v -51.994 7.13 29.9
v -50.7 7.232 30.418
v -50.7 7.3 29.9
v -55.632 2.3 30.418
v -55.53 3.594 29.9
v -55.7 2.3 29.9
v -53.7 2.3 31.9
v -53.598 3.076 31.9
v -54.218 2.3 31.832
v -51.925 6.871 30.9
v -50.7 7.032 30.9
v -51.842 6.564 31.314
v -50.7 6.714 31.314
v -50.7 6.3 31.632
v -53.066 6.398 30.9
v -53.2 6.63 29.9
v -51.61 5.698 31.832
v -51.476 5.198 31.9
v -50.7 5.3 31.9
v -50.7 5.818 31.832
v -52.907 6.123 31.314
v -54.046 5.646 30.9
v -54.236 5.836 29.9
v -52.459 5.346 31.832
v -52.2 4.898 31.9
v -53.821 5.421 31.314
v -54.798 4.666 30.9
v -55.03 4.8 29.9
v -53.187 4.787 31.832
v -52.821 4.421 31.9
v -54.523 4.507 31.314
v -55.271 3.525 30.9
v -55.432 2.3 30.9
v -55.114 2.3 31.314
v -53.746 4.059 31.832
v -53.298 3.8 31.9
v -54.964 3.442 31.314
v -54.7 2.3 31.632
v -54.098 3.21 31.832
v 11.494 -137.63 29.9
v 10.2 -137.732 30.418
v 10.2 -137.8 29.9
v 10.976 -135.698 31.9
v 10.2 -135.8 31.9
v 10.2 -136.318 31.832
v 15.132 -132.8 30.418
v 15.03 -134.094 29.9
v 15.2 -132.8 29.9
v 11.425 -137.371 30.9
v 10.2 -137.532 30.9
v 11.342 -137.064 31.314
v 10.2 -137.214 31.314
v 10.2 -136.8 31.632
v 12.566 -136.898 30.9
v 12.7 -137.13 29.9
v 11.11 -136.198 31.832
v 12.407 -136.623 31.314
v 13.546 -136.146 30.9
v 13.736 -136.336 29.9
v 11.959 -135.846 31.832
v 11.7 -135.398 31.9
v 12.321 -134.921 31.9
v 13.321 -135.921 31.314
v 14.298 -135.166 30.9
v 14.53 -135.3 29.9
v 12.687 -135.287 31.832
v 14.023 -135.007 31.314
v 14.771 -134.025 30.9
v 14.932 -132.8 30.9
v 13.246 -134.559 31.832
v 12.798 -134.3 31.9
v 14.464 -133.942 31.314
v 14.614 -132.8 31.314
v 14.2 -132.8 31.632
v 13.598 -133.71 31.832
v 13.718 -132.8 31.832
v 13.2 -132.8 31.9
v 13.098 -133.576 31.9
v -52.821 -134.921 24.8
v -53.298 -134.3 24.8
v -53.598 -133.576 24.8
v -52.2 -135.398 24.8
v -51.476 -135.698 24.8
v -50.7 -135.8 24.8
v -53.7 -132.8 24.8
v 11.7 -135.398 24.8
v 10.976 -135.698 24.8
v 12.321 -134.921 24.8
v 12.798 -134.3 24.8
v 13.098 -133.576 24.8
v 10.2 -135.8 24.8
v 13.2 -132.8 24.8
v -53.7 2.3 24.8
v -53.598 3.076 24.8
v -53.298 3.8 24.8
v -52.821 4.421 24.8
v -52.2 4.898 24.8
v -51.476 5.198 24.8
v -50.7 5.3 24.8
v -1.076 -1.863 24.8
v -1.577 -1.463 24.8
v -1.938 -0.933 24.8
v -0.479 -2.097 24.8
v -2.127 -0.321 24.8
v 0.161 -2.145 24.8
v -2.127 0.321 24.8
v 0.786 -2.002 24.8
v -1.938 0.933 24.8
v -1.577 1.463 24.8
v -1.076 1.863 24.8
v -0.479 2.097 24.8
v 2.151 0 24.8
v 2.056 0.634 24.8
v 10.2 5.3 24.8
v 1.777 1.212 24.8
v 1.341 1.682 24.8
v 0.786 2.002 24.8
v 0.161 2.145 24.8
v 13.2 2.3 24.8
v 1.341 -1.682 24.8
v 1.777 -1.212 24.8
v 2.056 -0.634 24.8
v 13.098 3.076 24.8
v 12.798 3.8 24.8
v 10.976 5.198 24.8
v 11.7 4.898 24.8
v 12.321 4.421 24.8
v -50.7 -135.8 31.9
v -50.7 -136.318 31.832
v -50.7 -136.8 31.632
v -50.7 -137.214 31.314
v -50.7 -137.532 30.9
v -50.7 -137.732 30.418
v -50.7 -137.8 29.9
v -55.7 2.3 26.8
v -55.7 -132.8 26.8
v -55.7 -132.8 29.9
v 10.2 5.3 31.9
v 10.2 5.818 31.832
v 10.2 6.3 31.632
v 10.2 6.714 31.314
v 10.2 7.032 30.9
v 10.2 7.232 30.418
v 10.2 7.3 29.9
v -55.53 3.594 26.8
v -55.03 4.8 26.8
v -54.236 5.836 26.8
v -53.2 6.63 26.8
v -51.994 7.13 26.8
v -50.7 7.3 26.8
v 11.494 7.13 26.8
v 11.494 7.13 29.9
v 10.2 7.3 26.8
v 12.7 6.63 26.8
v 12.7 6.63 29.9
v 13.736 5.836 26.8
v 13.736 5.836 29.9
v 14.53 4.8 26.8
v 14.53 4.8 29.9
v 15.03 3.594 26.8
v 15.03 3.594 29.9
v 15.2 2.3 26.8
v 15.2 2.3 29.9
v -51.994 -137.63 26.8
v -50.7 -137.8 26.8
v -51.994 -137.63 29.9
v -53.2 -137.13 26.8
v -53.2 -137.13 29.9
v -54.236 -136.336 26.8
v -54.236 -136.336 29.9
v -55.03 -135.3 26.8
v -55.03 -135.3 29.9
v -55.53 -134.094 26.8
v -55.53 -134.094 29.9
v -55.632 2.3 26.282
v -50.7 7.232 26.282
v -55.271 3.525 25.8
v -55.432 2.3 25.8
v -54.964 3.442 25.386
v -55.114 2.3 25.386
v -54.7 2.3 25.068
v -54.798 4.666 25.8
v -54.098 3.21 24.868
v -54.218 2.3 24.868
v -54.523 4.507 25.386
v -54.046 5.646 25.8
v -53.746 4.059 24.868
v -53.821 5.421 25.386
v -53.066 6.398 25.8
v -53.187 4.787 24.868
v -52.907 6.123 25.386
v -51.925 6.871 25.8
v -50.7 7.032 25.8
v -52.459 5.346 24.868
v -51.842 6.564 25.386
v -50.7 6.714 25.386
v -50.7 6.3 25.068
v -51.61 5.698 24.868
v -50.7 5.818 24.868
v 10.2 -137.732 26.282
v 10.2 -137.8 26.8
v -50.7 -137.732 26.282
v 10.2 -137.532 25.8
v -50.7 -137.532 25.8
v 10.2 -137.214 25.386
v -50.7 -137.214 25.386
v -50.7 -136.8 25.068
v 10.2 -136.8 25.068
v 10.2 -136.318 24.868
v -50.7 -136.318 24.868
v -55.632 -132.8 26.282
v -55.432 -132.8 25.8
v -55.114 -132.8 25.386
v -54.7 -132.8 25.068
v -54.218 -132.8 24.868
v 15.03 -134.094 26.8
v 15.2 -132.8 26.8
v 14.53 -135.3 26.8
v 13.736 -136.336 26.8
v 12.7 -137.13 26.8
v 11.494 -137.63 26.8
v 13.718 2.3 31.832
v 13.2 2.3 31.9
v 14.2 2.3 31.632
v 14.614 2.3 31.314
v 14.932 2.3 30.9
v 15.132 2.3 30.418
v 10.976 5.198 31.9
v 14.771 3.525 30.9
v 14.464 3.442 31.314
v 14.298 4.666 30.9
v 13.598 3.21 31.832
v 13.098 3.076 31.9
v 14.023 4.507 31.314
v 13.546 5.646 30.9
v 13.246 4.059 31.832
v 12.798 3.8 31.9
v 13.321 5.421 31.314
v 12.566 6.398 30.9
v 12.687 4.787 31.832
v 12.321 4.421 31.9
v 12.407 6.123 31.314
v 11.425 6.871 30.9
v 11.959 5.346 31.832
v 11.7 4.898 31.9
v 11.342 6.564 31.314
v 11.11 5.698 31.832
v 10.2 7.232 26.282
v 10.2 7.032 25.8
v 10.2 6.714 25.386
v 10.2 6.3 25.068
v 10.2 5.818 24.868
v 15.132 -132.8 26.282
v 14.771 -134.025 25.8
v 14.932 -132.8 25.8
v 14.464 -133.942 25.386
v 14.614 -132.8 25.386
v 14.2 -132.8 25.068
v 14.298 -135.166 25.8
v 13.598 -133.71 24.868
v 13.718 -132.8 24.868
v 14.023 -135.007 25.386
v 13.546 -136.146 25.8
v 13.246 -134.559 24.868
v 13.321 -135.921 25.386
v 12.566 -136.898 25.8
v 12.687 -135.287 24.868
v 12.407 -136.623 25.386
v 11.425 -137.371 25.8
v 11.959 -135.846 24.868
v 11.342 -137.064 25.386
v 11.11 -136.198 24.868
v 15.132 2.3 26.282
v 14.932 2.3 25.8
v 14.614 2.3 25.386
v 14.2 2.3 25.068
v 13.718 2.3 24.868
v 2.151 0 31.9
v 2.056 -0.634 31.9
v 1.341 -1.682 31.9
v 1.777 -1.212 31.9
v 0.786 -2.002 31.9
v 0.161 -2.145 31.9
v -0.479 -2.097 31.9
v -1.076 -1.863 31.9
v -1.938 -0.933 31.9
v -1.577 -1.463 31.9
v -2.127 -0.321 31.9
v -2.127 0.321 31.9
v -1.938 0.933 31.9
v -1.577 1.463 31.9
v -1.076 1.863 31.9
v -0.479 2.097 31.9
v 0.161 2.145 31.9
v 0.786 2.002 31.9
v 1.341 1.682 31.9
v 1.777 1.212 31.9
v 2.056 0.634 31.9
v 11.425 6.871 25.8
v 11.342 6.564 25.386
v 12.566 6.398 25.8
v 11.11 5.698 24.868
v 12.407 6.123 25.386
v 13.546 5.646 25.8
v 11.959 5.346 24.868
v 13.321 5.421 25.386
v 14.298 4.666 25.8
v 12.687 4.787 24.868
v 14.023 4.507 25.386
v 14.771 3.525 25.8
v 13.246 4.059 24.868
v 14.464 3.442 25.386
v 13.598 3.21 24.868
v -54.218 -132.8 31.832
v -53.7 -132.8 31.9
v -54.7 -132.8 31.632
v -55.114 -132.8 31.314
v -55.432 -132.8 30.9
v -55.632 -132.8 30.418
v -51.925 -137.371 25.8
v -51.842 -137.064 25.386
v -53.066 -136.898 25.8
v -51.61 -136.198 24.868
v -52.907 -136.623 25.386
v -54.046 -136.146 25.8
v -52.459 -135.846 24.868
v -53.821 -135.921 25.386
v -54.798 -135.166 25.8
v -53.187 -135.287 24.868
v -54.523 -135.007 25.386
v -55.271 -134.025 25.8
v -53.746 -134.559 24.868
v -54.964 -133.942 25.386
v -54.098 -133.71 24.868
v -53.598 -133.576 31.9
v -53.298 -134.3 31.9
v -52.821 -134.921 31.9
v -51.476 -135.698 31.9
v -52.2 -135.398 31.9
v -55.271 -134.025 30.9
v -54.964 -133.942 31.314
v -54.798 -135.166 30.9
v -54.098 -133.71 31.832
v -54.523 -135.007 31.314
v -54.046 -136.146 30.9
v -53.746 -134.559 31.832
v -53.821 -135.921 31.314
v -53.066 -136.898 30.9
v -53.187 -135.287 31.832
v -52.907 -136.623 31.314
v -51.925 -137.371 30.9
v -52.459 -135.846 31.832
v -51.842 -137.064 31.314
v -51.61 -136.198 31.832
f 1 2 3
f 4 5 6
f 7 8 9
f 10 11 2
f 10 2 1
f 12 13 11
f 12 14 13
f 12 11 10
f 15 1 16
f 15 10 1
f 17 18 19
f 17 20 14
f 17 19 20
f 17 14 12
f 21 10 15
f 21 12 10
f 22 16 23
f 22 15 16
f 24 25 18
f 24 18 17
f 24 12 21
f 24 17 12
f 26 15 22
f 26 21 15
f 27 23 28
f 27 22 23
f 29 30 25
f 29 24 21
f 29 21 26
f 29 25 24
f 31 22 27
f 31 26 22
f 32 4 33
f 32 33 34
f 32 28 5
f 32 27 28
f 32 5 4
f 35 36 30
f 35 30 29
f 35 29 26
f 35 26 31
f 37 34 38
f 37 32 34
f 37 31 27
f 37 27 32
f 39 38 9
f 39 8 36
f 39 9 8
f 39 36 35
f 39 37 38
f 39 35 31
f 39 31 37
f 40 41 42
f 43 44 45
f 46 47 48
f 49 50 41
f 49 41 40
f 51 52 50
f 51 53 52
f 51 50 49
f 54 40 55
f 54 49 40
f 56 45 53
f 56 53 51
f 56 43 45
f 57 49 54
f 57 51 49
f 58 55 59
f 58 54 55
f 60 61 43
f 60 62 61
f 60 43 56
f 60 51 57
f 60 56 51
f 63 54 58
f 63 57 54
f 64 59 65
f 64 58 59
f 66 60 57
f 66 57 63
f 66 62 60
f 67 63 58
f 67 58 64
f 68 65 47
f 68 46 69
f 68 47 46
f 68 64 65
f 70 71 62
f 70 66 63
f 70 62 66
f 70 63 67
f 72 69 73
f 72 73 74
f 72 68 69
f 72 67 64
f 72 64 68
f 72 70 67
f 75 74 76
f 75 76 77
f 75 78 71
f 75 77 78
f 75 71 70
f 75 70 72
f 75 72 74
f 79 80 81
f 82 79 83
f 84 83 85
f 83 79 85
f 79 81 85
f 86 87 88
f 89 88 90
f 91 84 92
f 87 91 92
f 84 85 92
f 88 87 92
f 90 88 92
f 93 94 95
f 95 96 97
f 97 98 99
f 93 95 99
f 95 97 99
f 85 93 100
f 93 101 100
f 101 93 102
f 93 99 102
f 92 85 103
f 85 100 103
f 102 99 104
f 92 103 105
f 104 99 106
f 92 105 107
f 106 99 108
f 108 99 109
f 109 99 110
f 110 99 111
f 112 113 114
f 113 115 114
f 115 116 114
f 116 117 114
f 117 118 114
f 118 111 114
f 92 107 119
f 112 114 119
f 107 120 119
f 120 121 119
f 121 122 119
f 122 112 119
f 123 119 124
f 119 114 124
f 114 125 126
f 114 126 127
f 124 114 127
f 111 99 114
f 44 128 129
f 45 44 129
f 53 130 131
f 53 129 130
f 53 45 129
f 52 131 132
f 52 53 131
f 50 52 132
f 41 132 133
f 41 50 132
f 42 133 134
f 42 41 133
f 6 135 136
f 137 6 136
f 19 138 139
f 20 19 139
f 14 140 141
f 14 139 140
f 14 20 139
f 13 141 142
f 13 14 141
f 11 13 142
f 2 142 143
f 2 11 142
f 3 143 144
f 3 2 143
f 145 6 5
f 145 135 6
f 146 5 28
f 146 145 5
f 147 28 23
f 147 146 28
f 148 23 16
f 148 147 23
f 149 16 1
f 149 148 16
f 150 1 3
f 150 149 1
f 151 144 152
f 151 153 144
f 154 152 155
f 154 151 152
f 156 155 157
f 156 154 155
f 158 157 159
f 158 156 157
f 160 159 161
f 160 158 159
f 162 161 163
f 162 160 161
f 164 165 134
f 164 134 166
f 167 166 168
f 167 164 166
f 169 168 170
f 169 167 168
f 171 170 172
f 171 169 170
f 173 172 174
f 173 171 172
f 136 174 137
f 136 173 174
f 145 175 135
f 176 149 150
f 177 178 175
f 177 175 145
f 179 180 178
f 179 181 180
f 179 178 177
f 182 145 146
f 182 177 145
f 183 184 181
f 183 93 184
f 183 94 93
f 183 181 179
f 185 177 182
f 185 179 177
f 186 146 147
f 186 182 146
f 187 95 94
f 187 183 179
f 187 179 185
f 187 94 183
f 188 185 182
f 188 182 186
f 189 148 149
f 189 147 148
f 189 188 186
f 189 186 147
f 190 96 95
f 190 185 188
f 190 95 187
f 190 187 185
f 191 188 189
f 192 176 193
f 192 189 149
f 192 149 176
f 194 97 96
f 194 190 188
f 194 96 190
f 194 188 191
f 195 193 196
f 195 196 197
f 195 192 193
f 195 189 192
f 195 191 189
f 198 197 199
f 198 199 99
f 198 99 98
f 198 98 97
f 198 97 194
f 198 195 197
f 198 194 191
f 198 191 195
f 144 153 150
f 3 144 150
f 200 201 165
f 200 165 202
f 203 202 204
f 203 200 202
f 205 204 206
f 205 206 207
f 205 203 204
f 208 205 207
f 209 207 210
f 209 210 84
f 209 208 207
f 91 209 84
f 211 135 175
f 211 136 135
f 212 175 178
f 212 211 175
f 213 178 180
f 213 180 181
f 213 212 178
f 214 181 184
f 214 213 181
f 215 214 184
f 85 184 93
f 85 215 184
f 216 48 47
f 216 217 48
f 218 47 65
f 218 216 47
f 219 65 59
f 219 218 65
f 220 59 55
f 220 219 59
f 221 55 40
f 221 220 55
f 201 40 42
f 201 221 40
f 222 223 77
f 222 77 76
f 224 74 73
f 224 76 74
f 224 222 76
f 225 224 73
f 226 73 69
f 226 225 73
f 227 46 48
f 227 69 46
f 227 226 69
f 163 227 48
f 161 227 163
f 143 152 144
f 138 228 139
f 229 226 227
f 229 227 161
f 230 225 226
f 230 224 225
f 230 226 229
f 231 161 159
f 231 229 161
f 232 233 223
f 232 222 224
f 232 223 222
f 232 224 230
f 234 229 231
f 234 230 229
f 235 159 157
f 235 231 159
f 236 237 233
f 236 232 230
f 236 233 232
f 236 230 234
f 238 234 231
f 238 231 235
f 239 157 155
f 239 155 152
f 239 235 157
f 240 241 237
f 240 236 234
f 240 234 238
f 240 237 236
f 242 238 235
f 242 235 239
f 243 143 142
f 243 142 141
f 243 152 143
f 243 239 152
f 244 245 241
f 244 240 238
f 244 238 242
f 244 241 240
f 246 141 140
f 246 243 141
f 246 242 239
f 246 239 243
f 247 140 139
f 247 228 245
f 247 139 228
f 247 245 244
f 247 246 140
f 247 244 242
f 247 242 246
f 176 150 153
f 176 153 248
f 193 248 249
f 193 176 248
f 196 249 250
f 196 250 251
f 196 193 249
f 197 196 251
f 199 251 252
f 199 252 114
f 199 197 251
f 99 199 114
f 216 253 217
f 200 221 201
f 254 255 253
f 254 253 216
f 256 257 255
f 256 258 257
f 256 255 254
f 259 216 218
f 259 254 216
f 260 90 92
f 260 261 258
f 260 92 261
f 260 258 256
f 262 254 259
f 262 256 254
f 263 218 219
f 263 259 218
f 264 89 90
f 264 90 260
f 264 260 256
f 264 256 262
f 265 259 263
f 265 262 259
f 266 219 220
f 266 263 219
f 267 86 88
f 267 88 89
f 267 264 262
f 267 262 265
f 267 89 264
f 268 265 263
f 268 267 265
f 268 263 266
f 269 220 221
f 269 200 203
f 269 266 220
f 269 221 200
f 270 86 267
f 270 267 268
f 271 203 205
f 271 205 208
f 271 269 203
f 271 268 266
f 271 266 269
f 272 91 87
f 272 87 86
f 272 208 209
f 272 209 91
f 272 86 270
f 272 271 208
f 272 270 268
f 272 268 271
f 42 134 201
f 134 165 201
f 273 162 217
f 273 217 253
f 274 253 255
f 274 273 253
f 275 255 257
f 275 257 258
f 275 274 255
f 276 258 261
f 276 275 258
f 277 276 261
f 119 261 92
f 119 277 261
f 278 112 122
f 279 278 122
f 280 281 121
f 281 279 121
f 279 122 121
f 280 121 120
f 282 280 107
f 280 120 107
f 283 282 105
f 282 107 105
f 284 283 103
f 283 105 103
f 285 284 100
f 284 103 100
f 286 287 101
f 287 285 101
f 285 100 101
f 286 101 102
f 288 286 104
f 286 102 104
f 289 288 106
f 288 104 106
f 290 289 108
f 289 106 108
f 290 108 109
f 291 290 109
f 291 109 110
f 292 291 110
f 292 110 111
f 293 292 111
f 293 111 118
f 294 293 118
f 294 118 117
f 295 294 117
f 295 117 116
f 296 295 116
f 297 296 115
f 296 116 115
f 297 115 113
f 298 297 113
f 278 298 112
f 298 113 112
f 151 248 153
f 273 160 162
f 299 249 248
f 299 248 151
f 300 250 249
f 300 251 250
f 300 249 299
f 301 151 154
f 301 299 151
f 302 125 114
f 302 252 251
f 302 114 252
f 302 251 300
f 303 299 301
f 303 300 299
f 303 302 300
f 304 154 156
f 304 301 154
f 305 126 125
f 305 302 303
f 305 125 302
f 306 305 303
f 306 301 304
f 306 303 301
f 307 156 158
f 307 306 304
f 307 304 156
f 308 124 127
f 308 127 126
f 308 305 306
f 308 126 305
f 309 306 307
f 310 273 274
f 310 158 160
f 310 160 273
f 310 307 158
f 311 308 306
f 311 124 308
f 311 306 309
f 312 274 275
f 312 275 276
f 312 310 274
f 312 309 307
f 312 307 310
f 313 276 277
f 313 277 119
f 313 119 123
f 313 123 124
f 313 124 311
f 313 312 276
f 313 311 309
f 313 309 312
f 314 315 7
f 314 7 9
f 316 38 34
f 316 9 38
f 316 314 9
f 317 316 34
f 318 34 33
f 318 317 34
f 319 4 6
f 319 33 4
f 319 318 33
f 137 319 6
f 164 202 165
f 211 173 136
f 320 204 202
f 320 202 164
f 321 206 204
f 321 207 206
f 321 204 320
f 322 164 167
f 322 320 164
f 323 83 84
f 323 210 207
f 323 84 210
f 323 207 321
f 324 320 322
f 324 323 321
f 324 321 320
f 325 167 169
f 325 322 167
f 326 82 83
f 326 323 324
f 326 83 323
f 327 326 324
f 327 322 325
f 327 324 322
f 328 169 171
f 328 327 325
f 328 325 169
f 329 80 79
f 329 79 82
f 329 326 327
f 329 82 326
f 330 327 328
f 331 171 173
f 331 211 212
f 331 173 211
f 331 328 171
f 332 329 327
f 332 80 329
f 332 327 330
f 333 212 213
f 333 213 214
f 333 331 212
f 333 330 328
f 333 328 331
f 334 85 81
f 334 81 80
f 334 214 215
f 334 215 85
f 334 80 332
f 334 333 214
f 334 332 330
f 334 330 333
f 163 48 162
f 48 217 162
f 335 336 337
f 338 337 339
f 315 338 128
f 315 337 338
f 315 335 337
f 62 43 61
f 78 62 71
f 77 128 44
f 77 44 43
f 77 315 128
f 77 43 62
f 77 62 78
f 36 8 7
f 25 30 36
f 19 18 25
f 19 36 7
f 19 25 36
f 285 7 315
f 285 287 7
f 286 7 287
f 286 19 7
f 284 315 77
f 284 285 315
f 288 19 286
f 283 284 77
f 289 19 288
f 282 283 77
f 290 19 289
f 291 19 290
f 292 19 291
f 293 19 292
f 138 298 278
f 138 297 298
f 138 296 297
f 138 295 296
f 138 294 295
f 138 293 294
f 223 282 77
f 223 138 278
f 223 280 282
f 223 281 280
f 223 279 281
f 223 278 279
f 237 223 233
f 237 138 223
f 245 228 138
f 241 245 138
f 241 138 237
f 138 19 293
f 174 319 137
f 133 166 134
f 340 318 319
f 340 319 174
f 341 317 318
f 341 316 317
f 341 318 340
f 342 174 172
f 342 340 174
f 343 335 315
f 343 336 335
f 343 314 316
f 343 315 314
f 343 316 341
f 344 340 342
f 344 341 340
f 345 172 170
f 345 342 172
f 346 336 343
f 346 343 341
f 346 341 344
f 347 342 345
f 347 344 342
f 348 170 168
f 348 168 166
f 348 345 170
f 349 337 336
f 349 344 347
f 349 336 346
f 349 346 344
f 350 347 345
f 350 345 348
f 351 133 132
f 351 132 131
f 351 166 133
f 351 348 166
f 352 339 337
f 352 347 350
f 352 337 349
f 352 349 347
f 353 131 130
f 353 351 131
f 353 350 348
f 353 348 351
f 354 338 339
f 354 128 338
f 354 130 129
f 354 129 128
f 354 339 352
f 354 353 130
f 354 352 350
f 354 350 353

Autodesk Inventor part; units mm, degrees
ref_plane "YZ Plane" through (0, 0, 0) normal (1, 0, 0) x (0, 1, 0)
ref_plane "XZ Plane" through (0, 0, 0) normal (0, 1, 0) x (-1, 0, 0)
ref_plane "XY Plane" through (0, 0, 0) normal (0, 0, 1) x (1, 0, 0)
ref_plane "Work Plane1" through (0, 0, 24.8) normal (0, 0, 1) x (1, 0, 0)
sketch "Sketch1" plane through (0, 0, 24.8) normal (0, 0, 1) x (1, 0, 0)
  circle A0 centre (0, 0) radius 2.1512
  line L0 (10.2, 7.3) -> (-50.7, 7.3)
  line L1 (-55.7, 2.3) -> (-55.7, -132.8)
  line L2 (-50.7, -137.8) -> (10.2, -137.8)
  line L3 (15.2, -132.8) -> (15.2, 2.3)
  arc A1 (-50.7, 7.3) -> (-55.7, 2.3) centre (-50.7, 2.3) ccw
  arc A2 (10.2, -137.8) -> (15.2, -132.8) centre (10.2, -132.8) ccw
  arc A3 (-55.7, -132.8) -> (-50.7, -137.8) centre (-50.7, -132.8) ccw
  arc A4 (15.2, 2.3) -> (10.2, 7.3) centre (10.2, 2.3) ccw
  point P0 (-55.7, -137.8)
  point P1 (-55.7, 7.3)
  point P2 (15.2, -137.8)
  dimension "d0" = 70.9
  dimension "d1" = 145.1
  dimension "d2" = 15.2
  dimension "d3" = 7.3
  dimension "d5" = 5
extrude "Extrusion1" add sketch "Sketch1" along normal blind 7.1
fillet "Fillet1" radius 2 16 edges at (13.7355, 5.8355, 31.9) (-20.25, 7.3, 31.9) (-54.2355, 5.8355, 31.9) (-55.7, -65.25, 31.9) (-54.2355, -136.3355, 31.9) (-20.25, -137.8, 31.9) (13.7355, -136.3355, 31.9) (15.2, -65.25, 31.9) (-54.2355, 5.8355, 24.8) (-55.7, -65.25, 24.8) (-54.2355, -136.3355, 24.8) (-20.25, -137.8, 24.8) (13.7355, -136.3355, 24.8) (15.2, -65.25, 24.8) (13.7355, 5.8355, 24.8) (-20.25, 7.3, 24.8)
properties part number "100_Huawei_P9"
